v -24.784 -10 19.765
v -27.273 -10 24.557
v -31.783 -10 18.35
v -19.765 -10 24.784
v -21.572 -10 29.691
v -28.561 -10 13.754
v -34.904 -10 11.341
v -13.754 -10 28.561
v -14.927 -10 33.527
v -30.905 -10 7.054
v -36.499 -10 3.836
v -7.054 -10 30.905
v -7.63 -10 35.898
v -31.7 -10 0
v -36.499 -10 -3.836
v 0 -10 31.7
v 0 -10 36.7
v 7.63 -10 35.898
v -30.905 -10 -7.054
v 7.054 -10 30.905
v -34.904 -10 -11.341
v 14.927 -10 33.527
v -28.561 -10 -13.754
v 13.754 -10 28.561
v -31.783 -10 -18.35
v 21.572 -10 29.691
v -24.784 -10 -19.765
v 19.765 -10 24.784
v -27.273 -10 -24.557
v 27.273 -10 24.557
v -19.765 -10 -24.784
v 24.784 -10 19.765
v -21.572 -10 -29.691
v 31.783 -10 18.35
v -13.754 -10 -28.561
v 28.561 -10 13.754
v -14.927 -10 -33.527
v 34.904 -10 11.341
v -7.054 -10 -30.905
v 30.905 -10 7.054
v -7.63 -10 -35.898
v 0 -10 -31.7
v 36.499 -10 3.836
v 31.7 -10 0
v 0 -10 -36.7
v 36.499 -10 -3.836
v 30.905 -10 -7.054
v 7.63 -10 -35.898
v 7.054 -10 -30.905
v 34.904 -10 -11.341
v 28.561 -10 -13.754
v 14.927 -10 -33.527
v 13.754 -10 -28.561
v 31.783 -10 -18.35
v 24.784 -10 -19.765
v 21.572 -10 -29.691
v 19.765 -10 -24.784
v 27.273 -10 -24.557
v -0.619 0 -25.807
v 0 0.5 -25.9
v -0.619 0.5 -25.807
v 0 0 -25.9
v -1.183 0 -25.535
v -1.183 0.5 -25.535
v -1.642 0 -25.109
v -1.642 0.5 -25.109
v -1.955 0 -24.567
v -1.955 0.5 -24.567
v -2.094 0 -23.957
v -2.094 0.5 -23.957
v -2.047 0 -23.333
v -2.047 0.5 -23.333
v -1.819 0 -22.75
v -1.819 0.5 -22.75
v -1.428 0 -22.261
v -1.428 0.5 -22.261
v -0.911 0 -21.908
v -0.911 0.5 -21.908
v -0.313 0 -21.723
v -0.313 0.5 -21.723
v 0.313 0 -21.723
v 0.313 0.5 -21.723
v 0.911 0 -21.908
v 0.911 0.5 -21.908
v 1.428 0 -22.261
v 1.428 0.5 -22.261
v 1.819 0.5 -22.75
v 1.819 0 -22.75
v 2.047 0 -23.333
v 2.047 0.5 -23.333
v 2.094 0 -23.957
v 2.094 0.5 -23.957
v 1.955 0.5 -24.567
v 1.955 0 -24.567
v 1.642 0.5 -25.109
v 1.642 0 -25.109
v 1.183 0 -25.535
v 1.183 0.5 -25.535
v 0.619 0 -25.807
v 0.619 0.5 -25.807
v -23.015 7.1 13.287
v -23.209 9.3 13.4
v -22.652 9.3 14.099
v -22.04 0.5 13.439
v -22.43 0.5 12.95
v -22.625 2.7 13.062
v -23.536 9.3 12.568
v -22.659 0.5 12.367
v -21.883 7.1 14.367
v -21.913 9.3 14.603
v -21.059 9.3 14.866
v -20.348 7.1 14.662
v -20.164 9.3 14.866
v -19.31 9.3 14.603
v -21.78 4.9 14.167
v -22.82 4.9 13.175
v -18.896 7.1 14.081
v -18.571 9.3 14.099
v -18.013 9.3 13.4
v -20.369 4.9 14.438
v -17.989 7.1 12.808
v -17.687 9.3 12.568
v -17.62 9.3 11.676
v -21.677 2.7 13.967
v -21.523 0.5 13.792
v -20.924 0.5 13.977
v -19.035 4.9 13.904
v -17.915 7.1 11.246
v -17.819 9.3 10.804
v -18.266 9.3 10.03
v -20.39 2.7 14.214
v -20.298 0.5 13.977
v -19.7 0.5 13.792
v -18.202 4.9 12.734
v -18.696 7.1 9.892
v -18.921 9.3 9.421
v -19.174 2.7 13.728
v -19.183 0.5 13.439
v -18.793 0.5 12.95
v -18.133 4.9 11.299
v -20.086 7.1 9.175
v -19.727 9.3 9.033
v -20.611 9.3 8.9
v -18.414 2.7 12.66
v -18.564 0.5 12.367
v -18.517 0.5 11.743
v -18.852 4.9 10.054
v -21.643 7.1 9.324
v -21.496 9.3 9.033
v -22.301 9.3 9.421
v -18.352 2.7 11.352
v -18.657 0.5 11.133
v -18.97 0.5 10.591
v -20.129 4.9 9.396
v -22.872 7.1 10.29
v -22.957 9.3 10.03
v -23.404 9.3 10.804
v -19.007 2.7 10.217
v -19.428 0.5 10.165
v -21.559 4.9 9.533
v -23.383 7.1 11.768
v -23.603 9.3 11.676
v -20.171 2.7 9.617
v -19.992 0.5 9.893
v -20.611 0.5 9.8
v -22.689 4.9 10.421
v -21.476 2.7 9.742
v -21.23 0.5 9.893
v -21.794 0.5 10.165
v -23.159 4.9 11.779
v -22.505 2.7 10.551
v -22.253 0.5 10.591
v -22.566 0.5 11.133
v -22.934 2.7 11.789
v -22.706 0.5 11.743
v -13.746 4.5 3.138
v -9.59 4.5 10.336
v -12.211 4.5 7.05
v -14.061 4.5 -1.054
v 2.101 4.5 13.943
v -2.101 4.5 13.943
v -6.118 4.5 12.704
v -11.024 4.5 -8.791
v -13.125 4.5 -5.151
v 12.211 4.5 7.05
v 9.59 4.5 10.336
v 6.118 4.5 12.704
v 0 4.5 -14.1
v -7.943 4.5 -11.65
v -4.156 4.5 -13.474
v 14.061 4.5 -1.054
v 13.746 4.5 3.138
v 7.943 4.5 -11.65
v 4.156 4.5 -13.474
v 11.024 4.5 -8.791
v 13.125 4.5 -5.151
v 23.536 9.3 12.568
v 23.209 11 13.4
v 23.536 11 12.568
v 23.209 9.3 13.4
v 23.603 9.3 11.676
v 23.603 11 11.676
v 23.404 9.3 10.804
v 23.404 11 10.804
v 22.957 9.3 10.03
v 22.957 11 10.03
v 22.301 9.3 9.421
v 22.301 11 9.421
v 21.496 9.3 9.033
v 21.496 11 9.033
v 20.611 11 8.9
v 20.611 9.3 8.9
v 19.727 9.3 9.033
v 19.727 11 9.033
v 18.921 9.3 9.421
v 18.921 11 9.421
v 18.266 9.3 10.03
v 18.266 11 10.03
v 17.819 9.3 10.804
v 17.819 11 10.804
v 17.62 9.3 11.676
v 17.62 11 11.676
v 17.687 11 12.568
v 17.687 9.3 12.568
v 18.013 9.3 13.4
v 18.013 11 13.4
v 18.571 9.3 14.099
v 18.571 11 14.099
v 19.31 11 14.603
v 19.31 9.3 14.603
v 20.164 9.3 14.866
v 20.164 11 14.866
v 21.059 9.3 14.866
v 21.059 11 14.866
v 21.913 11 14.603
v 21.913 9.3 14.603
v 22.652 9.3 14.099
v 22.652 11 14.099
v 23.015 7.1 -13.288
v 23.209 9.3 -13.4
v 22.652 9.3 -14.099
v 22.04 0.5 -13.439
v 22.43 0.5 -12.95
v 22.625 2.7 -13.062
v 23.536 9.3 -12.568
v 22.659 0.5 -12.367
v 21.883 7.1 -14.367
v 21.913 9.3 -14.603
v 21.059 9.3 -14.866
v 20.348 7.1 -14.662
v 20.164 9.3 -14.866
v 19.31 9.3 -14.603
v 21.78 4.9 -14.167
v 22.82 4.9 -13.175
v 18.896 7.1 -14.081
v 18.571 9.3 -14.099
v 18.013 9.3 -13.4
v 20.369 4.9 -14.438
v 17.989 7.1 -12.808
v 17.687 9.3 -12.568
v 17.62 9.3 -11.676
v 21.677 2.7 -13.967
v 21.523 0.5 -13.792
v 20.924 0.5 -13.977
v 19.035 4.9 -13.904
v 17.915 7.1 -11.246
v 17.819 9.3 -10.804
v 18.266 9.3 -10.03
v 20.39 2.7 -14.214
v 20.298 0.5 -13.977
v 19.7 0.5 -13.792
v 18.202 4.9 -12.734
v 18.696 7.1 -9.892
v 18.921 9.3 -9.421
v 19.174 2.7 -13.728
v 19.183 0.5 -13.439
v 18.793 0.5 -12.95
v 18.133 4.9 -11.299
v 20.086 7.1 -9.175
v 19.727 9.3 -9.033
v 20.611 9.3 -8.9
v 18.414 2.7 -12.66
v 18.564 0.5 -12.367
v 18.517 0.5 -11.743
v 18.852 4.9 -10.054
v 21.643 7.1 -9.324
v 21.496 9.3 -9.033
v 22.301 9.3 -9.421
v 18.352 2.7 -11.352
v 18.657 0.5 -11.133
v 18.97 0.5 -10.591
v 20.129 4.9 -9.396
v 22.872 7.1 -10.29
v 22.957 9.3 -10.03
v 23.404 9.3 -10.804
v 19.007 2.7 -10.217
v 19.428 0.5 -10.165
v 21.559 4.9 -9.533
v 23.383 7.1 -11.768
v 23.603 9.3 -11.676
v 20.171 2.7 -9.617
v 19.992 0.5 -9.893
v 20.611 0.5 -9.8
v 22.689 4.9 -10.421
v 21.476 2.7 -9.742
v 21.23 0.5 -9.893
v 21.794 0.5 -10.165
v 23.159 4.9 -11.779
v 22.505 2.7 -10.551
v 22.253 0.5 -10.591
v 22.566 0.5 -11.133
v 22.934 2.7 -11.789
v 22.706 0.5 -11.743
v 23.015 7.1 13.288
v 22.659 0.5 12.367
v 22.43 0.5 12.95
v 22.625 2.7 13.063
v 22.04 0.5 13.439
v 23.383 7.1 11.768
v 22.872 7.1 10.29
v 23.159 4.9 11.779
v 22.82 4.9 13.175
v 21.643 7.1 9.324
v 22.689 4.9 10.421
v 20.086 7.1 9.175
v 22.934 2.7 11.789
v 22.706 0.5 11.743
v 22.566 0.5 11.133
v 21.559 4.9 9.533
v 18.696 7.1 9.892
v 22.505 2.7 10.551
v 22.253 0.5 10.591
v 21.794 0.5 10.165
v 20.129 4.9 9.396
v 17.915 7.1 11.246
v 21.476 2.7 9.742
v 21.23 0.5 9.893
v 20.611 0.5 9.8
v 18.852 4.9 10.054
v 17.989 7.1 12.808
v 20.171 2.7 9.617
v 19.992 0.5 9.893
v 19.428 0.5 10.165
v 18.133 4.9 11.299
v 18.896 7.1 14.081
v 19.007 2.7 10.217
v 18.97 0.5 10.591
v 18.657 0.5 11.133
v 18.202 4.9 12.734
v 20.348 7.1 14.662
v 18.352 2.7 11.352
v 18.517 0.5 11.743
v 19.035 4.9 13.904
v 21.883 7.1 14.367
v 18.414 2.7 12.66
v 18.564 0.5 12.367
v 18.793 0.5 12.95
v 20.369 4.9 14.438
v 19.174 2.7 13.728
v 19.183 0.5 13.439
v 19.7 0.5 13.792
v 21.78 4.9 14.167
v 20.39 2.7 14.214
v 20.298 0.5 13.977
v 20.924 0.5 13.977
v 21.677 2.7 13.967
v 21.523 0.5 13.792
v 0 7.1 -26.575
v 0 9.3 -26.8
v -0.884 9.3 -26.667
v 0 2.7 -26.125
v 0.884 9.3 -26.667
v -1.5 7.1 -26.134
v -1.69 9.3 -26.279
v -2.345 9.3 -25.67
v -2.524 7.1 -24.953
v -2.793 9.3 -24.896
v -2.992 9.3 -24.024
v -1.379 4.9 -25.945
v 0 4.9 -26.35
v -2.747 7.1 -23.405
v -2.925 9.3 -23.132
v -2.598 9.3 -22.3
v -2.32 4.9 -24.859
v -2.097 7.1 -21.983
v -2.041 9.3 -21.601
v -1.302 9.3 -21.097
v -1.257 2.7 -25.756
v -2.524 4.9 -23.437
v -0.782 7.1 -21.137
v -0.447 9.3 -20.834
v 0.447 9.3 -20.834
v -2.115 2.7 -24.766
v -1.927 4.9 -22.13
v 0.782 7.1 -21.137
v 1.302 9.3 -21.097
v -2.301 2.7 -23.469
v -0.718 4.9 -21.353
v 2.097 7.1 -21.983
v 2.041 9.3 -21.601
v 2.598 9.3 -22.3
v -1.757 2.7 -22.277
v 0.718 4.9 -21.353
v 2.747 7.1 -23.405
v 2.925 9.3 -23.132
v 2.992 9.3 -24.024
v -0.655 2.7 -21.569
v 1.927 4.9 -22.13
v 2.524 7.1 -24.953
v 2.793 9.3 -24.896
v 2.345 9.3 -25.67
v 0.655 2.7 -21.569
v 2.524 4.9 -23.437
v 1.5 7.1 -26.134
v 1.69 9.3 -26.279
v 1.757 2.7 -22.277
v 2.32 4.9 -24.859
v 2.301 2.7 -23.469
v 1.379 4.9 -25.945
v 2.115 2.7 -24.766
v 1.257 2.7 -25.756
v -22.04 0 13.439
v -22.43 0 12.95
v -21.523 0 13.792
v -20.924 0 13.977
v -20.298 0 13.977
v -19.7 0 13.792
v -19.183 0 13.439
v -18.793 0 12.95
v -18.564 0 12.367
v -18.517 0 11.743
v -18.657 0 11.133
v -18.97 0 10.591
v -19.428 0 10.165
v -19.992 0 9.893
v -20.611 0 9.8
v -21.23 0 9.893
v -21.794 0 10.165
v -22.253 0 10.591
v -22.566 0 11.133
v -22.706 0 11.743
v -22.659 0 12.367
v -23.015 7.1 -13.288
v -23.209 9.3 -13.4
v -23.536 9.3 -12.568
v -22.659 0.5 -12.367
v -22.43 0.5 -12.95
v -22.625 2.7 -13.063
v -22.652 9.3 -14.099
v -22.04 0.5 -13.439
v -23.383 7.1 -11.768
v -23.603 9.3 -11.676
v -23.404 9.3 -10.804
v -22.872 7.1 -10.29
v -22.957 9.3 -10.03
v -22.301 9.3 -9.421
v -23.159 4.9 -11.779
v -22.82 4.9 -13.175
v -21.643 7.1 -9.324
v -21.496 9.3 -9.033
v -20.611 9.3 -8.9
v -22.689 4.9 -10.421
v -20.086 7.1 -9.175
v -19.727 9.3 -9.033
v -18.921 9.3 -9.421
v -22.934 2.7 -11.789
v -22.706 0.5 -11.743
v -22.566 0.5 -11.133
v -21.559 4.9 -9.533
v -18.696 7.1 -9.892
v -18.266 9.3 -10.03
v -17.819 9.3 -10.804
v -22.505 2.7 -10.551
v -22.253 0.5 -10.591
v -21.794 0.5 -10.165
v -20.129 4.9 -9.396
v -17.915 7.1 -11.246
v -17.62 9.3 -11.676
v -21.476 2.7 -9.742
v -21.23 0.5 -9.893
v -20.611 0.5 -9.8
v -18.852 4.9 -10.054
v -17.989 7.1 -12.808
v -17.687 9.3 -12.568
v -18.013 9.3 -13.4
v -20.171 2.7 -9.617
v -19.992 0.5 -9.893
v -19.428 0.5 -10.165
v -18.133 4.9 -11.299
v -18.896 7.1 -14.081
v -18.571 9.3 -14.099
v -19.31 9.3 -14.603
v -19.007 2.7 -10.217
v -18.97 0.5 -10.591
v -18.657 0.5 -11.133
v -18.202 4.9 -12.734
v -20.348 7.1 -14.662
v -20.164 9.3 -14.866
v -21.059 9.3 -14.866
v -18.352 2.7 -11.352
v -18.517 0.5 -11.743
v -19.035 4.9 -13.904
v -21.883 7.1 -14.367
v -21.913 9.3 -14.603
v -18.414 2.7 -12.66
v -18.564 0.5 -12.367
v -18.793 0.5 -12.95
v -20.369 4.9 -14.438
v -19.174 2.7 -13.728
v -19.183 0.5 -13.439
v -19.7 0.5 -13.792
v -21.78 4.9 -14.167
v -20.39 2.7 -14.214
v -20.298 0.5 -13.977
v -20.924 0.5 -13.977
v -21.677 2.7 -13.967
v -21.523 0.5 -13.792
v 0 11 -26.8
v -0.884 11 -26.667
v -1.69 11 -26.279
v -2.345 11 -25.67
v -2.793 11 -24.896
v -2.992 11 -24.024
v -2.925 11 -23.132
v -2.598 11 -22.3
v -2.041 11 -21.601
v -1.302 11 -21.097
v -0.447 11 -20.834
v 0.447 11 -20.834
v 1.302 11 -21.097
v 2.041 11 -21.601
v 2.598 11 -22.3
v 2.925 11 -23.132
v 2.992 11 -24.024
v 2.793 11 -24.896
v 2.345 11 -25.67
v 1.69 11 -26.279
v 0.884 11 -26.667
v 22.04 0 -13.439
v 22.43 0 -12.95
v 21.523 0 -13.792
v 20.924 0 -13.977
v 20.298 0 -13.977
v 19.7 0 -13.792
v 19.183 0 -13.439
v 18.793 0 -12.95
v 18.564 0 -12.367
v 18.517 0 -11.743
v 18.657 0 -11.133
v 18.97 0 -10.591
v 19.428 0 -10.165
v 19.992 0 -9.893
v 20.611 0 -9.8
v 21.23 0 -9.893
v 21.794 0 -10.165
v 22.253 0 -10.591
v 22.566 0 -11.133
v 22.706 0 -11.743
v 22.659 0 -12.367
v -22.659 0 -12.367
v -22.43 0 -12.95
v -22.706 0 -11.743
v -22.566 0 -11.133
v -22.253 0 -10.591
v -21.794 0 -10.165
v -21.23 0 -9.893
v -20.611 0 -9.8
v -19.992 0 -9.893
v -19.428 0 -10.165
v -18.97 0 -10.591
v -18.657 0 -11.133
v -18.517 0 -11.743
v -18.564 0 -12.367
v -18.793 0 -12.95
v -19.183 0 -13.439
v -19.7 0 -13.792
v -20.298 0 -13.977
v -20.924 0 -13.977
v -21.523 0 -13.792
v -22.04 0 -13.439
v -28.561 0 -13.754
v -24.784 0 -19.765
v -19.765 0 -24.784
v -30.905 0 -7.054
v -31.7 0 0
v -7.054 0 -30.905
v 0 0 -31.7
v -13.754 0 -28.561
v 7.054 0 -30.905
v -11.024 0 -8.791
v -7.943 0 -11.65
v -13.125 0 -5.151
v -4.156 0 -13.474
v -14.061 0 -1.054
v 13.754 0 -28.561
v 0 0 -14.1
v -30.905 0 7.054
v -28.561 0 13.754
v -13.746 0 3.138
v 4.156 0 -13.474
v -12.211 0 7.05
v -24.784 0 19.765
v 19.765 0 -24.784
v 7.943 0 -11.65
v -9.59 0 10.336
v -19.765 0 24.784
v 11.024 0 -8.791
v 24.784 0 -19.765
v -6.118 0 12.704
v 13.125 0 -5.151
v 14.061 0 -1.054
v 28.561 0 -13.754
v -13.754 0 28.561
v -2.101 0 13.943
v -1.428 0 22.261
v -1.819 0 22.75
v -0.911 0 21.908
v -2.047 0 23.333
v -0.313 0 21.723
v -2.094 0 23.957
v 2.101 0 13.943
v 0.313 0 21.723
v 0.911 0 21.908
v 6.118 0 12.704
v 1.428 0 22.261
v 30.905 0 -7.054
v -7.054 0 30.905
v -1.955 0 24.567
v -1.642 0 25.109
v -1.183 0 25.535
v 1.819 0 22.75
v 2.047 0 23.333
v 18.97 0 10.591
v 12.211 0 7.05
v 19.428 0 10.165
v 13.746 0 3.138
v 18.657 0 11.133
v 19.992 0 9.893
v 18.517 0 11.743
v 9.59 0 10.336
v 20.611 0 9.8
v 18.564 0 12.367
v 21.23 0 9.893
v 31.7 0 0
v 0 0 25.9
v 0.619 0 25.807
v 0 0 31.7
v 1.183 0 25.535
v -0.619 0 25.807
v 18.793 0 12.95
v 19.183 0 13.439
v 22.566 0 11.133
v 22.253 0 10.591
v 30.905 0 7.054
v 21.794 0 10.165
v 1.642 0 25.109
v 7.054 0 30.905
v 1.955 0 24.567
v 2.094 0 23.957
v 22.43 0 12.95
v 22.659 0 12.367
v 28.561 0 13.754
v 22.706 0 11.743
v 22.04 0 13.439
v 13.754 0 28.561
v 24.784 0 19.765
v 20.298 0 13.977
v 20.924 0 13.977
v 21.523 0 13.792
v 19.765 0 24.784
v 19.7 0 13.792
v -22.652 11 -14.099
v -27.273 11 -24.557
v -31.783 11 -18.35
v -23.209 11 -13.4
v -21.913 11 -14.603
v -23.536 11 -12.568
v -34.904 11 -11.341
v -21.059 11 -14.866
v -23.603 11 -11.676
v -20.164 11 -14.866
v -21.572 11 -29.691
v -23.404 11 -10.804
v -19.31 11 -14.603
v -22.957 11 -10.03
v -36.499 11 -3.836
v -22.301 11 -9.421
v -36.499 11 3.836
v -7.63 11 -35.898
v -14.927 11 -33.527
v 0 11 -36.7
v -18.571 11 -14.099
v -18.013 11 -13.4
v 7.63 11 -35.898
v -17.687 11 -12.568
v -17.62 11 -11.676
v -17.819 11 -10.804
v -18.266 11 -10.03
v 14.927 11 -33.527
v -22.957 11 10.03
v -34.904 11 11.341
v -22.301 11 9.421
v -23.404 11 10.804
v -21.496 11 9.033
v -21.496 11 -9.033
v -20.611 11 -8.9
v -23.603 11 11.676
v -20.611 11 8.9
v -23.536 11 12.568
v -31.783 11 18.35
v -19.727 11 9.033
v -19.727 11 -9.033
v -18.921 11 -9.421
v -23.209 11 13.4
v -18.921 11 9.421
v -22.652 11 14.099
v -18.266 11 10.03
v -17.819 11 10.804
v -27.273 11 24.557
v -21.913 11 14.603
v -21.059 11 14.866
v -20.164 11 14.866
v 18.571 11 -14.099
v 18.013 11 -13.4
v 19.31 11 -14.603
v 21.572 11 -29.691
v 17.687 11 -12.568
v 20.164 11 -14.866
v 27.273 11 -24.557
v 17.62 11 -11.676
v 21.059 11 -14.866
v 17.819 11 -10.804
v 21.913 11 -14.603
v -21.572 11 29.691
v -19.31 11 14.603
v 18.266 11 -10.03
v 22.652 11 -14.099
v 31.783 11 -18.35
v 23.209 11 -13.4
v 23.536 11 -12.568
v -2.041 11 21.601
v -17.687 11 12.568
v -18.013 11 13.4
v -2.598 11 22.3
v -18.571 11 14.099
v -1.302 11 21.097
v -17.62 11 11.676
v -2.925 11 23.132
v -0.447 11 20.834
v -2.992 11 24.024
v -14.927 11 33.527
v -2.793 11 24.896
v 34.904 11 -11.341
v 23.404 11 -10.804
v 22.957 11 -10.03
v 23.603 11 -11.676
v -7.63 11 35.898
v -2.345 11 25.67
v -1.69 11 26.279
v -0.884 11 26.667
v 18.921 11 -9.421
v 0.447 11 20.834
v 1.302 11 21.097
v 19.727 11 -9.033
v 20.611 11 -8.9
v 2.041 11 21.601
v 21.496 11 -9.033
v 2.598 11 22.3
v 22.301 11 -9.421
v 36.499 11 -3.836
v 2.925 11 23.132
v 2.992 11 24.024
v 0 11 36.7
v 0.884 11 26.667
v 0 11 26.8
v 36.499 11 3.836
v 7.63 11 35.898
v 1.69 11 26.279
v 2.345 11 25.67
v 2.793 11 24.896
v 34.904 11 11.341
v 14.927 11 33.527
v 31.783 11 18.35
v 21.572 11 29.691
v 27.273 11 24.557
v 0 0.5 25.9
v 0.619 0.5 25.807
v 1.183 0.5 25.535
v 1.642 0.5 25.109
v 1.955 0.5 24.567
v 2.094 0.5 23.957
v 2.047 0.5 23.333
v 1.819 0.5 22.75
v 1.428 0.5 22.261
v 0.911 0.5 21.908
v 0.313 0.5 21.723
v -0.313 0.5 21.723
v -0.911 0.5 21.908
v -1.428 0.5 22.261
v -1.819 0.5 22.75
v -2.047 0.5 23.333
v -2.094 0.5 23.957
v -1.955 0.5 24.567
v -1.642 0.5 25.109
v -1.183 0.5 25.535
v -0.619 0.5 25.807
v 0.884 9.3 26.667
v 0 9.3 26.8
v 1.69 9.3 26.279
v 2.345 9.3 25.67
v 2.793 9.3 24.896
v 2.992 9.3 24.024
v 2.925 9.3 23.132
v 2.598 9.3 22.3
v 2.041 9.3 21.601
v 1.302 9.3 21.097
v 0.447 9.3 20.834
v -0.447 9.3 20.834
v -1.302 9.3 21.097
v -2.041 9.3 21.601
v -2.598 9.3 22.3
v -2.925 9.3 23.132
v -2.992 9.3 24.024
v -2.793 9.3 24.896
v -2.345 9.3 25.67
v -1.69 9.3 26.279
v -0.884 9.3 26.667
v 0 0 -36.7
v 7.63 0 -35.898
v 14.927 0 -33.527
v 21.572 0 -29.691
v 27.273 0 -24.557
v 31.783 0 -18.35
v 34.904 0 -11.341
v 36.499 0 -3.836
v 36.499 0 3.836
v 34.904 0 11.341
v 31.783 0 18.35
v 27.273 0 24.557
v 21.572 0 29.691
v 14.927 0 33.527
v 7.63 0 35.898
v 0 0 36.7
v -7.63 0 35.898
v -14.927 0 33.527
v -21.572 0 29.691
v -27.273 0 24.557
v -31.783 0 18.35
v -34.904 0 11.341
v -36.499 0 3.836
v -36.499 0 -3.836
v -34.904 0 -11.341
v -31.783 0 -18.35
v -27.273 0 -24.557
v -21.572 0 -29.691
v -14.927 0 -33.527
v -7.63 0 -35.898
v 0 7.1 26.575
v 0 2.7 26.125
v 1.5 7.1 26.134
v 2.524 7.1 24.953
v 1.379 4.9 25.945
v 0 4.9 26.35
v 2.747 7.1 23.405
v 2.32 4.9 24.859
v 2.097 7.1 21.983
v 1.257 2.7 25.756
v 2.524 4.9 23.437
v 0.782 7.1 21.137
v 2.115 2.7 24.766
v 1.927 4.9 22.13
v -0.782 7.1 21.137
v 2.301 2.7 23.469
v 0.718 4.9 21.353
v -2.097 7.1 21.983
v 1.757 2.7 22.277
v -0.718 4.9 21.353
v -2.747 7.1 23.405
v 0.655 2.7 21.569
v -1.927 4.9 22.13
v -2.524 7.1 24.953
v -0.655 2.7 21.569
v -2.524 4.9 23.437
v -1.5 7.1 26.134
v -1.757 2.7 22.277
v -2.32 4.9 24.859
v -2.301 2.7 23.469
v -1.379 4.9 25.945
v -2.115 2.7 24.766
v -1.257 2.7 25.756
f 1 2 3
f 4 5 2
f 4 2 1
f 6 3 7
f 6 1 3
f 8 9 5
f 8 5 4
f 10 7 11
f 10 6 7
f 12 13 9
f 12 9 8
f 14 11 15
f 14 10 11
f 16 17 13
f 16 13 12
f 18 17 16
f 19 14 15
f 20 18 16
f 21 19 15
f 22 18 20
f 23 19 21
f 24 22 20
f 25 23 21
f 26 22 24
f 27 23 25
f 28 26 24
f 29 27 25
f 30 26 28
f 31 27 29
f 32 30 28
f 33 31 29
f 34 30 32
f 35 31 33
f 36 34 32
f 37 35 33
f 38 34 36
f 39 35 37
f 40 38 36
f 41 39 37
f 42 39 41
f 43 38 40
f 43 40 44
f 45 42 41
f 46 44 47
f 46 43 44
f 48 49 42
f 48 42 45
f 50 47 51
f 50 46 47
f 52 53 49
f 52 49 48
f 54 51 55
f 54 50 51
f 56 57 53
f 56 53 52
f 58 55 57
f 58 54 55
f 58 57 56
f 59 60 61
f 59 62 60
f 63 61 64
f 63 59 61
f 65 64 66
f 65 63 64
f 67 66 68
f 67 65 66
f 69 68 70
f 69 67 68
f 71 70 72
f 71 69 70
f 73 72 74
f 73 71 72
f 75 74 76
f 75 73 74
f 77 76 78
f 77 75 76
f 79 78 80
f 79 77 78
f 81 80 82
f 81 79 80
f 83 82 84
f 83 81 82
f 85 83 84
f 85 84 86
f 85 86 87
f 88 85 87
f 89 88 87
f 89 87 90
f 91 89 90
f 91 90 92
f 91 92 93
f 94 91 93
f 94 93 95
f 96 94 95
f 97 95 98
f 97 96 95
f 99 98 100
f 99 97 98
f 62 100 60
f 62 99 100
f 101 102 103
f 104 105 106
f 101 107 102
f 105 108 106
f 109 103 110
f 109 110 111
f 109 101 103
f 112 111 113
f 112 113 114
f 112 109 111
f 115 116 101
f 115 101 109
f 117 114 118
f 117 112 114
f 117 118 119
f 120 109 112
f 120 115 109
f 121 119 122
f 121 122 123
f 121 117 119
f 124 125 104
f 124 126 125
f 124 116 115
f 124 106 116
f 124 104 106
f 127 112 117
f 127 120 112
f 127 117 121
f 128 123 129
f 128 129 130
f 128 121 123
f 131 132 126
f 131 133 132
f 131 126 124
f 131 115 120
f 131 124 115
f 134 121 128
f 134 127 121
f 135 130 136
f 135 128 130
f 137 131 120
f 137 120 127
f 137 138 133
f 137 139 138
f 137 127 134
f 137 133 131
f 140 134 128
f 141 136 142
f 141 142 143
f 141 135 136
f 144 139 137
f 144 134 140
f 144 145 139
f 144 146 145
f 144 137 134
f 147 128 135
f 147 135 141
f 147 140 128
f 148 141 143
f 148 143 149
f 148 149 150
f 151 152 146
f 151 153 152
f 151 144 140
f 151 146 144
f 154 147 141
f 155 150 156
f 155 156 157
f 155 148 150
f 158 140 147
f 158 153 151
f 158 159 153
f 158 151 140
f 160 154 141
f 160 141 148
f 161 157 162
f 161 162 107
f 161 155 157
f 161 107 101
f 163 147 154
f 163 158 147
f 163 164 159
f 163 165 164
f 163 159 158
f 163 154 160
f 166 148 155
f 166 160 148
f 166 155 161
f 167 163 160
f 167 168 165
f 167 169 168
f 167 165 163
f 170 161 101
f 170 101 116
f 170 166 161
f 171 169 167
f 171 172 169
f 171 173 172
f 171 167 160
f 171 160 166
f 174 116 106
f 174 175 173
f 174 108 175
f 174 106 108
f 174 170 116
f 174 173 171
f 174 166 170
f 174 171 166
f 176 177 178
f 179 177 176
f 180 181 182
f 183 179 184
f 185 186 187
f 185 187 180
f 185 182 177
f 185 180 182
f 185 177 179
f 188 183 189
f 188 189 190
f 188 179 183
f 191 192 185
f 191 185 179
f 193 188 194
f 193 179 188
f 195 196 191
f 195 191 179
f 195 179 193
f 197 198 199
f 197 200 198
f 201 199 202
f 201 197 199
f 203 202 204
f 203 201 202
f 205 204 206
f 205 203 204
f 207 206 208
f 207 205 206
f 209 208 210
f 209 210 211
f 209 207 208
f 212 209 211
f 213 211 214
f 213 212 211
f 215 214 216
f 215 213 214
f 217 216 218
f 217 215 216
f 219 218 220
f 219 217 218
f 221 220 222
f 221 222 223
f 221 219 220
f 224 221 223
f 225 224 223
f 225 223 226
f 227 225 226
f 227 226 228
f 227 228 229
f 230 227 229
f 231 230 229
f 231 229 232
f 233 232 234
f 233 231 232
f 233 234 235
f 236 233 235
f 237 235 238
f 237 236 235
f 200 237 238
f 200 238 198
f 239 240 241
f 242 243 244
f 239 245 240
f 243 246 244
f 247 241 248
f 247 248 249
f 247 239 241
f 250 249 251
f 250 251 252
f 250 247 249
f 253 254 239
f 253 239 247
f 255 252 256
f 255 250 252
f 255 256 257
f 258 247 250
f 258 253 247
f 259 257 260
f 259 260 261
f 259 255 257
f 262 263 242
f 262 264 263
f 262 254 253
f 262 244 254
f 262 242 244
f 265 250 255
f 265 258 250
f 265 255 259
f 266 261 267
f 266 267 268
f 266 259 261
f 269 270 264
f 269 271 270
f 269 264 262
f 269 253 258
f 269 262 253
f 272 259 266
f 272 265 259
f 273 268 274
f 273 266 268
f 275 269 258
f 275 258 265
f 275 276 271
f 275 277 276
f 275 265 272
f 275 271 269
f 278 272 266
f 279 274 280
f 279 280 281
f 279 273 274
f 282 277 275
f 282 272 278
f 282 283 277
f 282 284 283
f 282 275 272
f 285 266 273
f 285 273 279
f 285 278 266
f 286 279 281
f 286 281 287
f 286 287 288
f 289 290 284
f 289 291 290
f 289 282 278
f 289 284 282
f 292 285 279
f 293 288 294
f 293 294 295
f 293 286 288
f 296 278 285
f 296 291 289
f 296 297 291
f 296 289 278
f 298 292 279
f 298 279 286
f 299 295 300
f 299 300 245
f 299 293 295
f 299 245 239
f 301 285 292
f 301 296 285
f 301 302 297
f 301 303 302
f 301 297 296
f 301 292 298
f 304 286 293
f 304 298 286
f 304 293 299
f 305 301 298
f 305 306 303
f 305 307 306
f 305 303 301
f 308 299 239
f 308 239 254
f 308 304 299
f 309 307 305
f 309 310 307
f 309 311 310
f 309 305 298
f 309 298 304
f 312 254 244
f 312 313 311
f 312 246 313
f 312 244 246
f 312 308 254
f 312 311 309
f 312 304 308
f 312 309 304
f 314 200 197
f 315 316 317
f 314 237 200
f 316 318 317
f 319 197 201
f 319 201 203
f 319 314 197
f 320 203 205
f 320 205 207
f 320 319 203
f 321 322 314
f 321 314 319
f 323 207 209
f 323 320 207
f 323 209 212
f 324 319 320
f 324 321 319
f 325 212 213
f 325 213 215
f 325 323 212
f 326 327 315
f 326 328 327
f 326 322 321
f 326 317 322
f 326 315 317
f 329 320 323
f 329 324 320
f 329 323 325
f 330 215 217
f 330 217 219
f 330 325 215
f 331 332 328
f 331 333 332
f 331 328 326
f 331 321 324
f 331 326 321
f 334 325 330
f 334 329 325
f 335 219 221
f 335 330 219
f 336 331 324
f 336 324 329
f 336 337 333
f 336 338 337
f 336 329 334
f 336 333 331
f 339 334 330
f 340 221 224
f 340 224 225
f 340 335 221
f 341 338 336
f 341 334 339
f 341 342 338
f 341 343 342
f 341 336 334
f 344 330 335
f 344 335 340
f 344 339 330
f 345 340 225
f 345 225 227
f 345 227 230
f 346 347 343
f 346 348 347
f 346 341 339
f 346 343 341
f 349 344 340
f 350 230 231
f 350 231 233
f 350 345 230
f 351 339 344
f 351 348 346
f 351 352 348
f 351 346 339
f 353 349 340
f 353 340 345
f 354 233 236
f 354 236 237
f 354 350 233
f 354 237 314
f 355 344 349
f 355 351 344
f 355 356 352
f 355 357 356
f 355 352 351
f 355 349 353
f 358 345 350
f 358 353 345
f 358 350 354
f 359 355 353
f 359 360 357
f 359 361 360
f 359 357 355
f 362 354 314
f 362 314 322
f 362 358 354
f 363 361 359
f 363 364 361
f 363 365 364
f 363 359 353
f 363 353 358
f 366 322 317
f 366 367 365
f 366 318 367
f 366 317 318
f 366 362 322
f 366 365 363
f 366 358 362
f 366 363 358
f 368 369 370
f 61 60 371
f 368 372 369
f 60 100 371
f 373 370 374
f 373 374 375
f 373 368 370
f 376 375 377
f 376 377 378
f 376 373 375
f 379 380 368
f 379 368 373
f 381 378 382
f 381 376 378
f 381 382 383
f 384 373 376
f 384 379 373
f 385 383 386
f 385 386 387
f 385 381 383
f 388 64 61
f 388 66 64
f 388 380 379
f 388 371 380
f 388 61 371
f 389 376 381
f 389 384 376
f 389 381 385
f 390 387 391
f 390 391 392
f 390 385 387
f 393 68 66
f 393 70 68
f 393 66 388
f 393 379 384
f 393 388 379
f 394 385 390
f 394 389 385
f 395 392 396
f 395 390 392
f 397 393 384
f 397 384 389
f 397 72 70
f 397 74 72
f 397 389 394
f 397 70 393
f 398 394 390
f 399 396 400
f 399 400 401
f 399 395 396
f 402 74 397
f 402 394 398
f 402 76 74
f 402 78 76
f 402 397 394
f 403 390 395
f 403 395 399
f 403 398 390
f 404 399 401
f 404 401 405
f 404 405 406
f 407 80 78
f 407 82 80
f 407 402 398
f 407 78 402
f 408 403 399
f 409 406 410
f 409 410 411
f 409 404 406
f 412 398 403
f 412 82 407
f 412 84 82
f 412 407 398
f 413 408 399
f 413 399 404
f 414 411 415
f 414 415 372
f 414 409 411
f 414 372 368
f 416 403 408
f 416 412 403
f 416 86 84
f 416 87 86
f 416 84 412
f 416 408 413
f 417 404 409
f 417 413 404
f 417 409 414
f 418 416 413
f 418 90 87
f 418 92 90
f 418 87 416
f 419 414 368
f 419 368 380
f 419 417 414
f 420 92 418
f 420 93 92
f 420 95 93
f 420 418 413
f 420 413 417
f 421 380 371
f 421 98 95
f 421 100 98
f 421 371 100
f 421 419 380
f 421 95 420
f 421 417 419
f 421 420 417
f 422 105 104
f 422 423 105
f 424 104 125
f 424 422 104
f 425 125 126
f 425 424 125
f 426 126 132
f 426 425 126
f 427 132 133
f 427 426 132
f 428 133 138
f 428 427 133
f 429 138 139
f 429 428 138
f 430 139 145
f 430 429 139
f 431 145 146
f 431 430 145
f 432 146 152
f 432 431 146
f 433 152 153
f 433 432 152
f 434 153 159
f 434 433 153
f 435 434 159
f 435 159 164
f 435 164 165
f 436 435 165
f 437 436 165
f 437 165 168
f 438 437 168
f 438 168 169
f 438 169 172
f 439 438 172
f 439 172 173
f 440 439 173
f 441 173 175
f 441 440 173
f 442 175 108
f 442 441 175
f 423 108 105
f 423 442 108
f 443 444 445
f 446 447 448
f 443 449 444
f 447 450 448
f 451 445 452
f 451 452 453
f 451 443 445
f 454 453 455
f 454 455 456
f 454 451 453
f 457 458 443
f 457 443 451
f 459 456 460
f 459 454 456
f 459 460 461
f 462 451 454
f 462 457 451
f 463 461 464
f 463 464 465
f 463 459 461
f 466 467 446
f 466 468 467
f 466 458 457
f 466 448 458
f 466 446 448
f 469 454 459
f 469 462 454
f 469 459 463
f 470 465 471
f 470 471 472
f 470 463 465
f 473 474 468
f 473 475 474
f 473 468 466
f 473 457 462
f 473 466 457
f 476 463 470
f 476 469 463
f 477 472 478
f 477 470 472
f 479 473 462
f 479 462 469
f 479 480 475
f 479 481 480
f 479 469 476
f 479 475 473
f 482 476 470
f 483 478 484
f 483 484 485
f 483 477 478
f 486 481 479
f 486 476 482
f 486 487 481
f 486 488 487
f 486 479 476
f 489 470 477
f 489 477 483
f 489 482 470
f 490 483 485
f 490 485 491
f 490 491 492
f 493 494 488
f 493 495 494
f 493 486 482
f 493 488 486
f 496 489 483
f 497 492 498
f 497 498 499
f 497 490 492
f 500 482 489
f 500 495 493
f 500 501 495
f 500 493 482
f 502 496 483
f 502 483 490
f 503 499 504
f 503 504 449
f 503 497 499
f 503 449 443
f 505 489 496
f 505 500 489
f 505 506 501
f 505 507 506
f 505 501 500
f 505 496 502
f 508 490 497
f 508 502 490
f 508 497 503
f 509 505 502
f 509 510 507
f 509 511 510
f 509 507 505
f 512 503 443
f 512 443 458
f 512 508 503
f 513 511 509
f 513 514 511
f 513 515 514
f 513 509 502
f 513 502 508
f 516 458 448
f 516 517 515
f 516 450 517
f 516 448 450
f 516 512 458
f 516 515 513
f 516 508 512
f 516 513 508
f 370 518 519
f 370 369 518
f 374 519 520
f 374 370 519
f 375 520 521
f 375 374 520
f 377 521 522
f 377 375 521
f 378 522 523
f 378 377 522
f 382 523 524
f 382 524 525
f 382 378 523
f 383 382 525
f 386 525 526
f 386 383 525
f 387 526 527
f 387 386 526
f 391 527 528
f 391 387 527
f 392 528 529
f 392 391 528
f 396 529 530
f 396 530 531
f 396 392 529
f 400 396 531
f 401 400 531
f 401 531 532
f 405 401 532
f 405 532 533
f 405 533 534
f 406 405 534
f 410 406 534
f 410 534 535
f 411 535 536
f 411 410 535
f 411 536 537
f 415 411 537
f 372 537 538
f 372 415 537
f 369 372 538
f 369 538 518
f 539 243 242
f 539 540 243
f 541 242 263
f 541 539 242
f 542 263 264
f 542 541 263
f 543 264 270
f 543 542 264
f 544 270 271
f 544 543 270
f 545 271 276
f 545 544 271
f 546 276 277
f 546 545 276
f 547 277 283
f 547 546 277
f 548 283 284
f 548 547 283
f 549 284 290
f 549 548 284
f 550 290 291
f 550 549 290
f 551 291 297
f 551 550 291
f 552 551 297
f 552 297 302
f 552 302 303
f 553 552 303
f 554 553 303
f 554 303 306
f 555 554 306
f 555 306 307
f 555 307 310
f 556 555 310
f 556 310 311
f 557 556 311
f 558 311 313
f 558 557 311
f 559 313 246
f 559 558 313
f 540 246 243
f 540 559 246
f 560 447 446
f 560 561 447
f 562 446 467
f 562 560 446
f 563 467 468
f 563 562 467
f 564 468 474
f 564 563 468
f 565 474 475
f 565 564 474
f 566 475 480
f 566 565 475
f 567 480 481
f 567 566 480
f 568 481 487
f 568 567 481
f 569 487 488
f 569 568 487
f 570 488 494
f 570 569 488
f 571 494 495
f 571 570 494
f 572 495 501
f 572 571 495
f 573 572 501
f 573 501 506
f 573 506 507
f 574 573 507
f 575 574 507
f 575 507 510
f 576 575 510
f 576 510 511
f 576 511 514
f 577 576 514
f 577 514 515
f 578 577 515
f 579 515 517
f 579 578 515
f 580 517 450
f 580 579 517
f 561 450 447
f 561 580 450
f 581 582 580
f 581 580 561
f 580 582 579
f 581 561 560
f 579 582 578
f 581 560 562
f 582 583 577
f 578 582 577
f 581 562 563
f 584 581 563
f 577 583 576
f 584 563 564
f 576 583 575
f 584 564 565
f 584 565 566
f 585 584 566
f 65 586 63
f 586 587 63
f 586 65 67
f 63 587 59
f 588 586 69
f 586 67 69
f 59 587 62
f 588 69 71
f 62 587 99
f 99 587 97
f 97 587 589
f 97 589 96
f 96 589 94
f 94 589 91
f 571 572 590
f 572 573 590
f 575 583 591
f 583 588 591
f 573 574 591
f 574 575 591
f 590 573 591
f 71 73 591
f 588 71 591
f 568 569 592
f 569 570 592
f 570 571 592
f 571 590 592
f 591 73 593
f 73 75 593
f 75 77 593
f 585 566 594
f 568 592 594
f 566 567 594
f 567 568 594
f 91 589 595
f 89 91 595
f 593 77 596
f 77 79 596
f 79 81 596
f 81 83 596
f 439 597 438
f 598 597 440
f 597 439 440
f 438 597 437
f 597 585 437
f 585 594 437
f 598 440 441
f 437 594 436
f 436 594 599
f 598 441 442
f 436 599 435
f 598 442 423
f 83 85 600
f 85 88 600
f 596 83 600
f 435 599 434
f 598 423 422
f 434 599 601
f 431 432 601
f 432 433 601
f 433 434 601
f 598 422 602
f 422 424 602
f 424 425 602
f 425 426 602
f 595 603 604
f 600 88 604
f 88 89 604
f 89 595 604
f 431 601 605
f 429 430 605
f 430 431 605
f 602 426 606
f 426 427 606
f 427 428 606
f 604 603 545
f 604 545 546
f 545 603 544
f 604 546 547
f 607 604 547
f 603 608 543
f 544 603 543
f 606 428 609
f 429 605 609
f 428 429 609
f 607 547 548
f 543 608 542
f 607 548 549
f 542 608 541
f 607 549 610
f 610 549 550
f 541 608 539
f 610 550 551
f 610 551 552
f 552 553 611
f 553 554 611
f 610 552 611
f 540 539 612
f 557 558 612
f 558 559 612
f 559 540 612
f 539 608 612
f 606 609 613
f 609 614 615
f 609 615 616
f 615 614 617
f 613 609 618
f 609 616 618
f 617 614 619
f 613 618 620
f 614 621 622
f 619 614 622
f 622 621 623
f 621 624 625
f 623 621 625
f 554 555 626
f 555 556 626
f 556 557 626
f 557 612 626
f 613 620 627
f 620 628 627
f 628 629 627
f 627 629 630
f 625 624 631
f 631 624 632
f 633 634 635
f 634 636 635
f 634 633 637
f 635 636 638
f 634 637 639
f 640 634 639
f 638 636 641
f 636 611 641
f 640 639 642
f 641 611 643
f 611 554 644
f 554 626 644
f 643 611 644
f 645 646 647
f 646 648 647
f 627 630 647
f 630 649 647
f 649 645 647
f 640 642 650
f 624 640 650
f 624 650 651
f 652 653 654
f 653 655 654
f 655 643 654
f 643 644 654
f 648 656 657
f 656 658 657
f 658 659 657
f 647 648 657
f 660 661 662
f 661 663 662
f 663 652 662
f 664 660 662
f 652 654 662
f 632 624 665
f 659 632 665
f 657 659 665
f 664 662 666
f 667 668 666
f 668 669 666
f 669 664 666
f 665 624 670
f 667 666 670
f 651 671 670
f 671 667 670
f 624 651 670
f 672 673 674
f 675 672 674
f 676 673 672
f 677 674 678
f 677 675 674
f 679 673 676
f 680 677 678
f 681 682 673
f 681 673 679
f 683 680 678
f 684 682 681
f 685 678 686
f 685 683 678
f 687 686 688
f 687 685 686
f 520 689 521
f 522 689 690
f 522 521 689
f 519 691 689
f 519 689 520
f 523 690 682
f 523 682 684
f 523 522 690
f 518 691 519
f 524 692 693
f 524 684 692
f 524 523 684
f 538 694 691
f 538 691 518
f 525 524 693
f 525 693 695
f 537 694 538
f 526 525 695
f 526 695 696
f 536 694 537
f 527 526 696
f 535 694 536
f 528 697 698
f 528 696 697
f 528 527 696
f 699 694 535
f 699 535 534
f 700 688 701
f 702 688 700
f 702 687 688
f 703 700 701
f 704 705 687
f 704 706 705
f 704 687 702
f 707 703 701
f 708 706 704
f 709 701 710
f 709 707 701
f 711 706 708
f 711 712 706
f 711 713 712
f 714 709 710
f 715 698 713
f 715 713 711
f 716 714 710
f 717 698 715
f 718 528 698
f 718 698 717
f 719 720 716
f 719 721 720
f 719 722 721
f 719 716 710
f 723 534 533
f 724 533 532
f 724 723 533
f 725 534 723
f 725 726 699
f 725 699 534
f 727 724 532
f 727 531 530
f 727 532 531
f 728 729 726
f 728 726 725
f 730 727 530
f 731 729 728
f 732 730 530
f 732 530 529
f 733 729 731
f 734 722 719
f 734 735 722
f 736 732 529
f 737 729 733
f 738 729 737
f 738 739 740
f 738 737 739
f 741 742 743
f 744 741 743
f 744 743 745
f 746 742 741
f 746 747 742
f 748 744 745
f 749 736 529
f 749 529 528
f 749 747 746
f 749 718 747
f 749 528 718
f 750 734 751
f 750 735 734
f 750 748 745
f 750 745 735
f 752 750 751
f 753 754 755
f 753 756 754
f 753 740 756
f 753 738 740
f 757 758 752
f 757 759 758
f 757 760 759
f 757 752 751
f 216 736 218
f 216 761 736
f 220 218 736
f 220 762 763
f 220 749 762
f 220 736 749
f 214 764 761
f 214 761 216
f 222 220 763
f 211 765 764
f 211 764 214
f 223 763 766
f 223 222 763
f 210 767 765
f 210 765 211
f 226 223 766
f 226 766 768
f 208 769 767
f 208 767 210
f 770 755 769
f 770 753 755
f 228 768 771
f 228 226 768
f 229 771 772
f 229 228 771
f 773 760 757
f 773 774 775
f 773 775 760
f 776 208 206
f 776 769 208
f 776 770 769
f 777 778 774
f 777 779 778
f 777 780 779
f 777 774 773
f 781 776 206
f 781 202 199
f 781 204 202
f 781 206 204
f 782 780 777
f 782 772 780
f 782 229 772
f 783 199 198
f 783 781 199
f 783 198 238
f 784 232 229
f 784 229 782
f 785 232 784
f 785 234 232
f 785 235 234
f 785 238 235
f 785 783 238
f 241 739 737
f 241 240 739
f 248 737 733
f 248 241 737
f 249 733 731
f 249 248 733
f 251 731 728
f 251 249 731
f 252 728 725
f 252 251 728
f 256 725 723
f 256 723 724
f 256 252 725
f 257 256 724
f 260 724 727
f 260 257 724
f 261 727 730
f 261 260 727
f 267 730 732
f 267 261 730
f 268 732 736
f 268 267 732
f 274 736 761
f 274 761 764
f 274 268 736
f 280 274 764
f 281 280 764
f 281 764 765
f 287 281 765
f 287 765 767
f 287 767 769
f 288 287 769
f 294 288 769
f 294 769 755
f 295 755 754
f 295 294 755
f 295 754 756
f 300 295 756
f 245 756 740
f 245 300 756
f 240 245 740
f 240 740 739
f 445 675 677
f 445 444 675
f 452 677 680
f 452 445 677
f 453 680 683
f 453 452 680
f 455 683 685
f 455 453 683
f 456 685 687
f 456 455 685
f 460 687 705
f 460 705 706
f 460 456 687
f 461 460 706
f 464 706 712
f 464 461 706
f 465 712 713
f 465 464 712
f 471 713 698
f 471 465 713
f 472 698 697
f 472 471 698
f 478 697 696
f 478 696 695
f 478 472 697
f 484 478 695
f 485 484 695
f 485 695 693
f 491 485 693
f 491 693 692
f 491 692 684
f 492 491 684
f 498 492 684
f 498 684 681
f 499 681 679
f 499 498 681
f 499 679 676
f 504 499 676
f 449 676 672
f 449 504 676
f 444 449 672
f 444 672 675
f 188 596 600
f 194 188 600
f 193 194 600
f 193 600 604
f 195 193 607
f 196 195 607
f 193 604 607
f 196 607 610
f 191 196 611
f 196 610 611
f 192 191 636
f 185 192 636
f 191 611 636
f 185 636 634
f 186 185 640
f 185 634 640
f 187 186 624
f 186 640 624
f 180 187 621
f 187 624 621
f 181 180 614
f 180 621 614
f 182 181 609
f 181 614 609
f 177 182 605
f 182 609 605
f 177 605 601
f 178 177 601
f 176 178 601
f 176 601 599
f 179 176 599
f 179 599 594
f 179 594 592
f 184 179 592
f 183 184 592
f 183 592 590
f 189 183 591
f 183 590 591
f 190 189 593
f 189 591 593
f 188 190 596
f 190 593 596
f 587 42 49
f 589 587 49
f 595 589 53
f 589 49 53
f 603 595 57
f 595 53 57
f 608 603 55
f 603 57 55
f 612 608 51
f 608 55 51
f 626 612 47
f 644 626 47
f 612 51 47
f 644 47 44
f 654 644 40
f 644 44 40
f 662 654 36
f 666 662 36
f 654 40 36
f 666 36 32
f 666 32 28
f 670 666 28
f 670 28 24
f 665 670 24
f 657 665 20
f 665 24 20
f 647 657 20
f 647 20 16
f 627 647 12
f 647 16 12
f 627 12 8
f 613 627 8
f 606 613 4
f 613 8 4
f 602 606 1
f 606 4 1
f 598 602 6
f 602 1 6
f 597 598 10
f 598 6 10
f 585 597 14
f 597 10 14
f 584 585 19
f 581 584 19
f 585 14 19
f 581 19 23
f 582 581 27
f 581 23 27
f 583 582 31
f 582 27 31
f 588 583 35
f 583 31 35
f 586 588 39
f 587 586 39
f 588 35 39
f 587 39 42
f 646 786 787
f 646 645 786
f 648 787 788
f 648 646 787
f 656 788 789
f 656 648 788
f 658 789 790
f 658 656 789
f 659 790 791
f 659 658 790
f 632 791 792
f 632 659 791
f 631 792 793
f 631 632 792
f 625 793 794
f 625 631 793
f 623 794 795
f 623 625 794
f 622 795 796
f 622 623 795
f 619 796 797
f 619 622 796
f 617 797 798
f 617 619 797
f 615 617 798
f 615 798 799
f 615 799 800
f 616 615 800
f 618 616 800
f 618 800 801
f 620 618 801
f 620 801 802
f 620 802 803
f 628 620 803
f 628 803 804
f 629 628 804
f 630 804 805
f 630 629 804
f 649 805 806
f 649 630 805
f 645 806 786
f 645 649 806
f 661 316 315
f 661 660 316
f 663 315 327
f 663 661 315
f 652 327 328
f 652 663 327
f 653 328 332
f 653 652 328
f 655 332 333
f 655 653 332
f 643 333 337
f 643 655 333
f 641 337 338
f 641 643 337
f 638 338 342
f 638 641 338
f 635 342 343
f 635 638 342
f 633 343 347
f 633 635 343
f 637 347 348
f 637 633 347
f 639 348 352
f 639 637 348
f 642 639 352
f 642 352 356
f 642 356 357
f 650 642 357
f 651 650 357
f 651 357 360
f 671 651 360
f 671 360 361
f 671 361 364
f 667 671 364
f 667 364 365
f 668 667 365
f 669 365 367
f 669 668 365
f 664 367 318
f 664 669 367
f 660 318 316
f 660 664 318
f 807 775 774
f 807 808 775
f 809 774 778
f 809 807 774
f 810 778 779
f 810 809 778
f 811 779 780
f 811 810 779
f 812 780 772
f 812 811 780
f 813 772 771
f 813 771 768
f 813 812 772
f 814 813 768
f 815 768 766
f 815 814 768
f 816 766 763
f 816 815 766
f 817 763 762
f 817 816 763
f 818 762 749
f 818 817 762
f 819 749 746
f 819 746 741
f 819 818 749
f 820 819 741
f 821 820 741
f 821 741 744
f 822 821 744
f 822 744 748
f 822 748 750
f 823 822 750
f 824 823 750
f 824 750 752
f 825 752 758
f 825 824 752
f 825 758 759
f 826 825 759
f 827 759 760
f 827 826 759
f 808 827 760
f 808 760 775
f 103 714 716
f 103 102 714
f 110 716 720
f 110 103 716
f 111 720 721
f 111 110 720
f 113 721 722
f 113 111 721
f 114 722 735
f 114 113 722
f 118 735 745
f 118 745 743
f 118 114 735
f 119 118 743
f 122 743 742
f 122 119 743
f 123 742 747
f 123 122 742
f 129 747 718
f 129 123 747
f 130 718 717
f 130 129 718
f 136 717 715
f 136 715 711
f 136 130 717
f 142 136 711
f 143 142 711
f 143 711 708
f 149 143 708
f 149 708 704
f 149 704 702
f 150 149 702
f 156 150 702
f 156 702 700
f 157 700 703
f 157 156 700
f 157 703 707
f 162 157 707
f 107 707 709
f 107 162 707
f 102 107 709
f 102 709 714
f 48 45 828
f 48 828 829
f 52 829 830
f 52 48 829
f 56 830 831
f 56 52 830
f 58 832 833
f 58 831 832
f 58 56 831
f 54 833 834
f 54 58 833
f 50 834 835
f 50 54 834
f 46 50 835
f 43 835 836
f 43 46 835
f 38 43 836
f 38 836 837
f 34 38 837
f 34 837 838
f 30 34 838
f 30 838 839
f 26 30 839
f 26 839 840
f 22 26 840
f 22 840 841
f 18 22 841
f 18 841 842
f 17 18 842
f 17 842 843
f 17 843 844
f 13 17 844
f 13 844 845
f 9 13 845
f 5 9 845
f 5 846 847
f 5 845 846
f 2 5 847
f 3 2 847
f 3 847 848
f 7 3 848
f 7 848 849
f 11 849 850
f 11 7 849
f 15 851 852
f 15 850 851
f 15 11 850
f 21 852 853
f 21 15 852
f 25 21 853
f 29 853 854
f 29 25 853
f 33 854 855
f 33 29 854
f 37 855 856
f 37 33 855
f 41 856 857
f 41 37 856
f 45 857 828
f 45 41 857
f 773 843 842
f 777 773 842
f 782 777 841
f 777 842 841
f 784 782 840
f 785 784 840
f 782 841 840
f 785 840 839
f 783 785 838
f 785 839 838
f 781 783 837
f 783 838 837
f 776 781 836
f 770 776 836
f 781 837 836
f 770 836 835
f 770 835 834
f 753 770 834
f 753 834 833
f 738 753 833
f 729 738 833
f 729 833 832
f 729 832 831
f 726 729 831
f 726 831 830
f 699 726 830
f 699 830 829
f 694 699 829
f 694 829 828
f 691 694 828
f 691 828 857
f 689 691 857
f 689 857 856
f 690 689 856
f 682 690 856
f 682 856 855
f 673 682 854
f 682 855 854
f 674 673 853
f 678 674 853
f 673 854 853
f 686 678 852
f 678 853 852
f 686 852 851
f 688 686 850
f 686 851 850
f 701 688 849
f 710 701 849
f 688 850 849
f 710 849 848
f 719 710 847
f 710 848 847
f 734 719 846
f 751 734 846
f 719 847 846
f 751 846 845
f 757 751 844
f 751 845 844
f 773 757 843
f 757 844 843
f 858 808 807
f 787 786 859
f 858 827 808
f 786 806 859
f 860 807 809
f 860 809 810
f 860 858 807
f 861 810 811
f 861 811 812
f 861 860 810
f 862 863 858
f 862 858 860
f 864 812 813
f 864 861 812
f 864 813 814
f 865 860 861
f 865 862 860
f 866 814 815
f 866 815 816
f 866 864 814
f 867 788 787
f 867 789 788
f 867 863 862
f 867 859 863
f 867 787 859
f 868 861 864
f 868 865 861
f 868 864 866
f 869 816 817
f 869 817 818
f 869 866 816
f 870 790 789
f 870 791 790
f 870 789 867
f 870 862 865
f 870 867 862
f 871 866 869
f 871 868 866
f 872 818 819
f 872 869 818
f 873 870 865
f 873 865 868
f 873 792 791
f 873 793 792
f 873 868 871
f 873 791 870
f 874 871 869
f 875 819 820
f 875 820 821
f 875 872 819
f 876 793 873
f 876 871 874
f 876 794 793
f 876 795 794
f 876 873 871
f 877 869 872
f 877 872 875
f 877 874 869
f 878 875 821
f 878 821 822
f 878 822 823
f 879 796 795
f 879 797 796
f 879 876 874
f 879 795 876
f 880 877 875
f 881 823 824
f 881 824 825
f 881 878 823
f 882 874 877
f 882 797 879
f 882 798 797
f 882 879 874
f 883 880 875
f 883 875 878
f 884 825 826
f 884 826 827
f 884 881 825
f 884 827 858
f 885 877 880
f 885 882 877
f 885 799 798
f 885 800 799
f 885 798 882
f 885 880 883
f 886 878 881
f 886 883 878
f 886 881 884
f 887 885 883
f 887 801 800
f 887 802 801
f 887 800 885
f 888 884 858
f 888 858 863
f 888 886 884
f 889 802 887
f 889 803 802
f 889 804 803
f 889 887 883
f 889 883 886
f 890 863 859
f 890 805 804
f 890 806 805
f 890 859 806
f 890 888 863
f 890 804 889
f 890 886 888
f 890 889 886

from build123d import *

# Parameters (mm, degrees)
SKETCH2_R           = 36.7
BOSS_EXTRUDE1_DEPTH = 11
SKETCH5_R           = 14.1
CUT_EXTRUDE1_DEPTH  = 4.5
BOSS_EXTRUDE2_START = 10
SKETCH7_R           = 36.7
SKETCH7_R_2         = 31.7
BOSS_EXTRUDE2_DEPTH = 10
CIRPATTERN1_COUNT   = 6


with BuildPart() as part:
    # Sketch2 → Boss-Extrude1 (new body)
    with BuildSketch(Plane(origin=(0, 0, 0), x_dir=(1, 0, 0), z_dir=(0, 1, 0))):
        with Locations(Location((0, 0, 0), (0, 0, 270))):
            Circle(SKETCH2_R)
    extrude(amount=BOSS_EXTRUDE1_DEPTH)

    # Sketch3 → Cut-Revolve1 (revolve, cut)
    with BuildSketch(Plane(origin=(0, 0, 0), x_dir=(0, 0, -1), z_dir=(1, 0, 0))):
        Polygon((26.8, 11), (26.8, 9.3), (25.9, 0.5), (25.9, 0), (23.8, 0), (23.8, 11), align=None)
    cut_revolve1 = revolve(axis=Axis((0, 0, -23.8), (0, 1, 0)), mode=Mode.SUBTRACT)

    # Sketch5 → Cut-Extrude1 (cut)
    with BuildSketch(Plane.XZ):
        with Locations(Location((0, 0, 0), (0, 0, 270))):
            Circle(SKETCH5_R)
    extrude(amount=-CUT_EXTRUDE1_DEPTH, mode=Mode.SUBTRACT)

    # Sketch7 → Boss-Extrude2 (add)
    with BuildSketch(Plane.XZ.offset(BOSS_EXTRUDE2_START)):
        with Locations(Location((0, 0, 0), (0, 0, 270))):
            Circle(SKETCH7_R)
        with Locations(Location((0, 0, 0), (0, 0, 270))):
            Circle(SKETCH7_R_2, mode=Mode.SUBTRACT)
    extrude(amount=-BOSS_EXTRUDE2_DEPTH)

    # CirPattern1: Cut-Revolve1 ×6 about axis
    cirpattern1_axis = Axis((0, 0, 0), (0, 1, 0))
    for i in range(1, CIRPATTERN1_COUNT):
        add(cut_revolve1.rotate(cirpattern1_axis, i * 360 / CIRPATTERN1_COUNT), mode=Mode.SUBTRACT)


solid = part.part
